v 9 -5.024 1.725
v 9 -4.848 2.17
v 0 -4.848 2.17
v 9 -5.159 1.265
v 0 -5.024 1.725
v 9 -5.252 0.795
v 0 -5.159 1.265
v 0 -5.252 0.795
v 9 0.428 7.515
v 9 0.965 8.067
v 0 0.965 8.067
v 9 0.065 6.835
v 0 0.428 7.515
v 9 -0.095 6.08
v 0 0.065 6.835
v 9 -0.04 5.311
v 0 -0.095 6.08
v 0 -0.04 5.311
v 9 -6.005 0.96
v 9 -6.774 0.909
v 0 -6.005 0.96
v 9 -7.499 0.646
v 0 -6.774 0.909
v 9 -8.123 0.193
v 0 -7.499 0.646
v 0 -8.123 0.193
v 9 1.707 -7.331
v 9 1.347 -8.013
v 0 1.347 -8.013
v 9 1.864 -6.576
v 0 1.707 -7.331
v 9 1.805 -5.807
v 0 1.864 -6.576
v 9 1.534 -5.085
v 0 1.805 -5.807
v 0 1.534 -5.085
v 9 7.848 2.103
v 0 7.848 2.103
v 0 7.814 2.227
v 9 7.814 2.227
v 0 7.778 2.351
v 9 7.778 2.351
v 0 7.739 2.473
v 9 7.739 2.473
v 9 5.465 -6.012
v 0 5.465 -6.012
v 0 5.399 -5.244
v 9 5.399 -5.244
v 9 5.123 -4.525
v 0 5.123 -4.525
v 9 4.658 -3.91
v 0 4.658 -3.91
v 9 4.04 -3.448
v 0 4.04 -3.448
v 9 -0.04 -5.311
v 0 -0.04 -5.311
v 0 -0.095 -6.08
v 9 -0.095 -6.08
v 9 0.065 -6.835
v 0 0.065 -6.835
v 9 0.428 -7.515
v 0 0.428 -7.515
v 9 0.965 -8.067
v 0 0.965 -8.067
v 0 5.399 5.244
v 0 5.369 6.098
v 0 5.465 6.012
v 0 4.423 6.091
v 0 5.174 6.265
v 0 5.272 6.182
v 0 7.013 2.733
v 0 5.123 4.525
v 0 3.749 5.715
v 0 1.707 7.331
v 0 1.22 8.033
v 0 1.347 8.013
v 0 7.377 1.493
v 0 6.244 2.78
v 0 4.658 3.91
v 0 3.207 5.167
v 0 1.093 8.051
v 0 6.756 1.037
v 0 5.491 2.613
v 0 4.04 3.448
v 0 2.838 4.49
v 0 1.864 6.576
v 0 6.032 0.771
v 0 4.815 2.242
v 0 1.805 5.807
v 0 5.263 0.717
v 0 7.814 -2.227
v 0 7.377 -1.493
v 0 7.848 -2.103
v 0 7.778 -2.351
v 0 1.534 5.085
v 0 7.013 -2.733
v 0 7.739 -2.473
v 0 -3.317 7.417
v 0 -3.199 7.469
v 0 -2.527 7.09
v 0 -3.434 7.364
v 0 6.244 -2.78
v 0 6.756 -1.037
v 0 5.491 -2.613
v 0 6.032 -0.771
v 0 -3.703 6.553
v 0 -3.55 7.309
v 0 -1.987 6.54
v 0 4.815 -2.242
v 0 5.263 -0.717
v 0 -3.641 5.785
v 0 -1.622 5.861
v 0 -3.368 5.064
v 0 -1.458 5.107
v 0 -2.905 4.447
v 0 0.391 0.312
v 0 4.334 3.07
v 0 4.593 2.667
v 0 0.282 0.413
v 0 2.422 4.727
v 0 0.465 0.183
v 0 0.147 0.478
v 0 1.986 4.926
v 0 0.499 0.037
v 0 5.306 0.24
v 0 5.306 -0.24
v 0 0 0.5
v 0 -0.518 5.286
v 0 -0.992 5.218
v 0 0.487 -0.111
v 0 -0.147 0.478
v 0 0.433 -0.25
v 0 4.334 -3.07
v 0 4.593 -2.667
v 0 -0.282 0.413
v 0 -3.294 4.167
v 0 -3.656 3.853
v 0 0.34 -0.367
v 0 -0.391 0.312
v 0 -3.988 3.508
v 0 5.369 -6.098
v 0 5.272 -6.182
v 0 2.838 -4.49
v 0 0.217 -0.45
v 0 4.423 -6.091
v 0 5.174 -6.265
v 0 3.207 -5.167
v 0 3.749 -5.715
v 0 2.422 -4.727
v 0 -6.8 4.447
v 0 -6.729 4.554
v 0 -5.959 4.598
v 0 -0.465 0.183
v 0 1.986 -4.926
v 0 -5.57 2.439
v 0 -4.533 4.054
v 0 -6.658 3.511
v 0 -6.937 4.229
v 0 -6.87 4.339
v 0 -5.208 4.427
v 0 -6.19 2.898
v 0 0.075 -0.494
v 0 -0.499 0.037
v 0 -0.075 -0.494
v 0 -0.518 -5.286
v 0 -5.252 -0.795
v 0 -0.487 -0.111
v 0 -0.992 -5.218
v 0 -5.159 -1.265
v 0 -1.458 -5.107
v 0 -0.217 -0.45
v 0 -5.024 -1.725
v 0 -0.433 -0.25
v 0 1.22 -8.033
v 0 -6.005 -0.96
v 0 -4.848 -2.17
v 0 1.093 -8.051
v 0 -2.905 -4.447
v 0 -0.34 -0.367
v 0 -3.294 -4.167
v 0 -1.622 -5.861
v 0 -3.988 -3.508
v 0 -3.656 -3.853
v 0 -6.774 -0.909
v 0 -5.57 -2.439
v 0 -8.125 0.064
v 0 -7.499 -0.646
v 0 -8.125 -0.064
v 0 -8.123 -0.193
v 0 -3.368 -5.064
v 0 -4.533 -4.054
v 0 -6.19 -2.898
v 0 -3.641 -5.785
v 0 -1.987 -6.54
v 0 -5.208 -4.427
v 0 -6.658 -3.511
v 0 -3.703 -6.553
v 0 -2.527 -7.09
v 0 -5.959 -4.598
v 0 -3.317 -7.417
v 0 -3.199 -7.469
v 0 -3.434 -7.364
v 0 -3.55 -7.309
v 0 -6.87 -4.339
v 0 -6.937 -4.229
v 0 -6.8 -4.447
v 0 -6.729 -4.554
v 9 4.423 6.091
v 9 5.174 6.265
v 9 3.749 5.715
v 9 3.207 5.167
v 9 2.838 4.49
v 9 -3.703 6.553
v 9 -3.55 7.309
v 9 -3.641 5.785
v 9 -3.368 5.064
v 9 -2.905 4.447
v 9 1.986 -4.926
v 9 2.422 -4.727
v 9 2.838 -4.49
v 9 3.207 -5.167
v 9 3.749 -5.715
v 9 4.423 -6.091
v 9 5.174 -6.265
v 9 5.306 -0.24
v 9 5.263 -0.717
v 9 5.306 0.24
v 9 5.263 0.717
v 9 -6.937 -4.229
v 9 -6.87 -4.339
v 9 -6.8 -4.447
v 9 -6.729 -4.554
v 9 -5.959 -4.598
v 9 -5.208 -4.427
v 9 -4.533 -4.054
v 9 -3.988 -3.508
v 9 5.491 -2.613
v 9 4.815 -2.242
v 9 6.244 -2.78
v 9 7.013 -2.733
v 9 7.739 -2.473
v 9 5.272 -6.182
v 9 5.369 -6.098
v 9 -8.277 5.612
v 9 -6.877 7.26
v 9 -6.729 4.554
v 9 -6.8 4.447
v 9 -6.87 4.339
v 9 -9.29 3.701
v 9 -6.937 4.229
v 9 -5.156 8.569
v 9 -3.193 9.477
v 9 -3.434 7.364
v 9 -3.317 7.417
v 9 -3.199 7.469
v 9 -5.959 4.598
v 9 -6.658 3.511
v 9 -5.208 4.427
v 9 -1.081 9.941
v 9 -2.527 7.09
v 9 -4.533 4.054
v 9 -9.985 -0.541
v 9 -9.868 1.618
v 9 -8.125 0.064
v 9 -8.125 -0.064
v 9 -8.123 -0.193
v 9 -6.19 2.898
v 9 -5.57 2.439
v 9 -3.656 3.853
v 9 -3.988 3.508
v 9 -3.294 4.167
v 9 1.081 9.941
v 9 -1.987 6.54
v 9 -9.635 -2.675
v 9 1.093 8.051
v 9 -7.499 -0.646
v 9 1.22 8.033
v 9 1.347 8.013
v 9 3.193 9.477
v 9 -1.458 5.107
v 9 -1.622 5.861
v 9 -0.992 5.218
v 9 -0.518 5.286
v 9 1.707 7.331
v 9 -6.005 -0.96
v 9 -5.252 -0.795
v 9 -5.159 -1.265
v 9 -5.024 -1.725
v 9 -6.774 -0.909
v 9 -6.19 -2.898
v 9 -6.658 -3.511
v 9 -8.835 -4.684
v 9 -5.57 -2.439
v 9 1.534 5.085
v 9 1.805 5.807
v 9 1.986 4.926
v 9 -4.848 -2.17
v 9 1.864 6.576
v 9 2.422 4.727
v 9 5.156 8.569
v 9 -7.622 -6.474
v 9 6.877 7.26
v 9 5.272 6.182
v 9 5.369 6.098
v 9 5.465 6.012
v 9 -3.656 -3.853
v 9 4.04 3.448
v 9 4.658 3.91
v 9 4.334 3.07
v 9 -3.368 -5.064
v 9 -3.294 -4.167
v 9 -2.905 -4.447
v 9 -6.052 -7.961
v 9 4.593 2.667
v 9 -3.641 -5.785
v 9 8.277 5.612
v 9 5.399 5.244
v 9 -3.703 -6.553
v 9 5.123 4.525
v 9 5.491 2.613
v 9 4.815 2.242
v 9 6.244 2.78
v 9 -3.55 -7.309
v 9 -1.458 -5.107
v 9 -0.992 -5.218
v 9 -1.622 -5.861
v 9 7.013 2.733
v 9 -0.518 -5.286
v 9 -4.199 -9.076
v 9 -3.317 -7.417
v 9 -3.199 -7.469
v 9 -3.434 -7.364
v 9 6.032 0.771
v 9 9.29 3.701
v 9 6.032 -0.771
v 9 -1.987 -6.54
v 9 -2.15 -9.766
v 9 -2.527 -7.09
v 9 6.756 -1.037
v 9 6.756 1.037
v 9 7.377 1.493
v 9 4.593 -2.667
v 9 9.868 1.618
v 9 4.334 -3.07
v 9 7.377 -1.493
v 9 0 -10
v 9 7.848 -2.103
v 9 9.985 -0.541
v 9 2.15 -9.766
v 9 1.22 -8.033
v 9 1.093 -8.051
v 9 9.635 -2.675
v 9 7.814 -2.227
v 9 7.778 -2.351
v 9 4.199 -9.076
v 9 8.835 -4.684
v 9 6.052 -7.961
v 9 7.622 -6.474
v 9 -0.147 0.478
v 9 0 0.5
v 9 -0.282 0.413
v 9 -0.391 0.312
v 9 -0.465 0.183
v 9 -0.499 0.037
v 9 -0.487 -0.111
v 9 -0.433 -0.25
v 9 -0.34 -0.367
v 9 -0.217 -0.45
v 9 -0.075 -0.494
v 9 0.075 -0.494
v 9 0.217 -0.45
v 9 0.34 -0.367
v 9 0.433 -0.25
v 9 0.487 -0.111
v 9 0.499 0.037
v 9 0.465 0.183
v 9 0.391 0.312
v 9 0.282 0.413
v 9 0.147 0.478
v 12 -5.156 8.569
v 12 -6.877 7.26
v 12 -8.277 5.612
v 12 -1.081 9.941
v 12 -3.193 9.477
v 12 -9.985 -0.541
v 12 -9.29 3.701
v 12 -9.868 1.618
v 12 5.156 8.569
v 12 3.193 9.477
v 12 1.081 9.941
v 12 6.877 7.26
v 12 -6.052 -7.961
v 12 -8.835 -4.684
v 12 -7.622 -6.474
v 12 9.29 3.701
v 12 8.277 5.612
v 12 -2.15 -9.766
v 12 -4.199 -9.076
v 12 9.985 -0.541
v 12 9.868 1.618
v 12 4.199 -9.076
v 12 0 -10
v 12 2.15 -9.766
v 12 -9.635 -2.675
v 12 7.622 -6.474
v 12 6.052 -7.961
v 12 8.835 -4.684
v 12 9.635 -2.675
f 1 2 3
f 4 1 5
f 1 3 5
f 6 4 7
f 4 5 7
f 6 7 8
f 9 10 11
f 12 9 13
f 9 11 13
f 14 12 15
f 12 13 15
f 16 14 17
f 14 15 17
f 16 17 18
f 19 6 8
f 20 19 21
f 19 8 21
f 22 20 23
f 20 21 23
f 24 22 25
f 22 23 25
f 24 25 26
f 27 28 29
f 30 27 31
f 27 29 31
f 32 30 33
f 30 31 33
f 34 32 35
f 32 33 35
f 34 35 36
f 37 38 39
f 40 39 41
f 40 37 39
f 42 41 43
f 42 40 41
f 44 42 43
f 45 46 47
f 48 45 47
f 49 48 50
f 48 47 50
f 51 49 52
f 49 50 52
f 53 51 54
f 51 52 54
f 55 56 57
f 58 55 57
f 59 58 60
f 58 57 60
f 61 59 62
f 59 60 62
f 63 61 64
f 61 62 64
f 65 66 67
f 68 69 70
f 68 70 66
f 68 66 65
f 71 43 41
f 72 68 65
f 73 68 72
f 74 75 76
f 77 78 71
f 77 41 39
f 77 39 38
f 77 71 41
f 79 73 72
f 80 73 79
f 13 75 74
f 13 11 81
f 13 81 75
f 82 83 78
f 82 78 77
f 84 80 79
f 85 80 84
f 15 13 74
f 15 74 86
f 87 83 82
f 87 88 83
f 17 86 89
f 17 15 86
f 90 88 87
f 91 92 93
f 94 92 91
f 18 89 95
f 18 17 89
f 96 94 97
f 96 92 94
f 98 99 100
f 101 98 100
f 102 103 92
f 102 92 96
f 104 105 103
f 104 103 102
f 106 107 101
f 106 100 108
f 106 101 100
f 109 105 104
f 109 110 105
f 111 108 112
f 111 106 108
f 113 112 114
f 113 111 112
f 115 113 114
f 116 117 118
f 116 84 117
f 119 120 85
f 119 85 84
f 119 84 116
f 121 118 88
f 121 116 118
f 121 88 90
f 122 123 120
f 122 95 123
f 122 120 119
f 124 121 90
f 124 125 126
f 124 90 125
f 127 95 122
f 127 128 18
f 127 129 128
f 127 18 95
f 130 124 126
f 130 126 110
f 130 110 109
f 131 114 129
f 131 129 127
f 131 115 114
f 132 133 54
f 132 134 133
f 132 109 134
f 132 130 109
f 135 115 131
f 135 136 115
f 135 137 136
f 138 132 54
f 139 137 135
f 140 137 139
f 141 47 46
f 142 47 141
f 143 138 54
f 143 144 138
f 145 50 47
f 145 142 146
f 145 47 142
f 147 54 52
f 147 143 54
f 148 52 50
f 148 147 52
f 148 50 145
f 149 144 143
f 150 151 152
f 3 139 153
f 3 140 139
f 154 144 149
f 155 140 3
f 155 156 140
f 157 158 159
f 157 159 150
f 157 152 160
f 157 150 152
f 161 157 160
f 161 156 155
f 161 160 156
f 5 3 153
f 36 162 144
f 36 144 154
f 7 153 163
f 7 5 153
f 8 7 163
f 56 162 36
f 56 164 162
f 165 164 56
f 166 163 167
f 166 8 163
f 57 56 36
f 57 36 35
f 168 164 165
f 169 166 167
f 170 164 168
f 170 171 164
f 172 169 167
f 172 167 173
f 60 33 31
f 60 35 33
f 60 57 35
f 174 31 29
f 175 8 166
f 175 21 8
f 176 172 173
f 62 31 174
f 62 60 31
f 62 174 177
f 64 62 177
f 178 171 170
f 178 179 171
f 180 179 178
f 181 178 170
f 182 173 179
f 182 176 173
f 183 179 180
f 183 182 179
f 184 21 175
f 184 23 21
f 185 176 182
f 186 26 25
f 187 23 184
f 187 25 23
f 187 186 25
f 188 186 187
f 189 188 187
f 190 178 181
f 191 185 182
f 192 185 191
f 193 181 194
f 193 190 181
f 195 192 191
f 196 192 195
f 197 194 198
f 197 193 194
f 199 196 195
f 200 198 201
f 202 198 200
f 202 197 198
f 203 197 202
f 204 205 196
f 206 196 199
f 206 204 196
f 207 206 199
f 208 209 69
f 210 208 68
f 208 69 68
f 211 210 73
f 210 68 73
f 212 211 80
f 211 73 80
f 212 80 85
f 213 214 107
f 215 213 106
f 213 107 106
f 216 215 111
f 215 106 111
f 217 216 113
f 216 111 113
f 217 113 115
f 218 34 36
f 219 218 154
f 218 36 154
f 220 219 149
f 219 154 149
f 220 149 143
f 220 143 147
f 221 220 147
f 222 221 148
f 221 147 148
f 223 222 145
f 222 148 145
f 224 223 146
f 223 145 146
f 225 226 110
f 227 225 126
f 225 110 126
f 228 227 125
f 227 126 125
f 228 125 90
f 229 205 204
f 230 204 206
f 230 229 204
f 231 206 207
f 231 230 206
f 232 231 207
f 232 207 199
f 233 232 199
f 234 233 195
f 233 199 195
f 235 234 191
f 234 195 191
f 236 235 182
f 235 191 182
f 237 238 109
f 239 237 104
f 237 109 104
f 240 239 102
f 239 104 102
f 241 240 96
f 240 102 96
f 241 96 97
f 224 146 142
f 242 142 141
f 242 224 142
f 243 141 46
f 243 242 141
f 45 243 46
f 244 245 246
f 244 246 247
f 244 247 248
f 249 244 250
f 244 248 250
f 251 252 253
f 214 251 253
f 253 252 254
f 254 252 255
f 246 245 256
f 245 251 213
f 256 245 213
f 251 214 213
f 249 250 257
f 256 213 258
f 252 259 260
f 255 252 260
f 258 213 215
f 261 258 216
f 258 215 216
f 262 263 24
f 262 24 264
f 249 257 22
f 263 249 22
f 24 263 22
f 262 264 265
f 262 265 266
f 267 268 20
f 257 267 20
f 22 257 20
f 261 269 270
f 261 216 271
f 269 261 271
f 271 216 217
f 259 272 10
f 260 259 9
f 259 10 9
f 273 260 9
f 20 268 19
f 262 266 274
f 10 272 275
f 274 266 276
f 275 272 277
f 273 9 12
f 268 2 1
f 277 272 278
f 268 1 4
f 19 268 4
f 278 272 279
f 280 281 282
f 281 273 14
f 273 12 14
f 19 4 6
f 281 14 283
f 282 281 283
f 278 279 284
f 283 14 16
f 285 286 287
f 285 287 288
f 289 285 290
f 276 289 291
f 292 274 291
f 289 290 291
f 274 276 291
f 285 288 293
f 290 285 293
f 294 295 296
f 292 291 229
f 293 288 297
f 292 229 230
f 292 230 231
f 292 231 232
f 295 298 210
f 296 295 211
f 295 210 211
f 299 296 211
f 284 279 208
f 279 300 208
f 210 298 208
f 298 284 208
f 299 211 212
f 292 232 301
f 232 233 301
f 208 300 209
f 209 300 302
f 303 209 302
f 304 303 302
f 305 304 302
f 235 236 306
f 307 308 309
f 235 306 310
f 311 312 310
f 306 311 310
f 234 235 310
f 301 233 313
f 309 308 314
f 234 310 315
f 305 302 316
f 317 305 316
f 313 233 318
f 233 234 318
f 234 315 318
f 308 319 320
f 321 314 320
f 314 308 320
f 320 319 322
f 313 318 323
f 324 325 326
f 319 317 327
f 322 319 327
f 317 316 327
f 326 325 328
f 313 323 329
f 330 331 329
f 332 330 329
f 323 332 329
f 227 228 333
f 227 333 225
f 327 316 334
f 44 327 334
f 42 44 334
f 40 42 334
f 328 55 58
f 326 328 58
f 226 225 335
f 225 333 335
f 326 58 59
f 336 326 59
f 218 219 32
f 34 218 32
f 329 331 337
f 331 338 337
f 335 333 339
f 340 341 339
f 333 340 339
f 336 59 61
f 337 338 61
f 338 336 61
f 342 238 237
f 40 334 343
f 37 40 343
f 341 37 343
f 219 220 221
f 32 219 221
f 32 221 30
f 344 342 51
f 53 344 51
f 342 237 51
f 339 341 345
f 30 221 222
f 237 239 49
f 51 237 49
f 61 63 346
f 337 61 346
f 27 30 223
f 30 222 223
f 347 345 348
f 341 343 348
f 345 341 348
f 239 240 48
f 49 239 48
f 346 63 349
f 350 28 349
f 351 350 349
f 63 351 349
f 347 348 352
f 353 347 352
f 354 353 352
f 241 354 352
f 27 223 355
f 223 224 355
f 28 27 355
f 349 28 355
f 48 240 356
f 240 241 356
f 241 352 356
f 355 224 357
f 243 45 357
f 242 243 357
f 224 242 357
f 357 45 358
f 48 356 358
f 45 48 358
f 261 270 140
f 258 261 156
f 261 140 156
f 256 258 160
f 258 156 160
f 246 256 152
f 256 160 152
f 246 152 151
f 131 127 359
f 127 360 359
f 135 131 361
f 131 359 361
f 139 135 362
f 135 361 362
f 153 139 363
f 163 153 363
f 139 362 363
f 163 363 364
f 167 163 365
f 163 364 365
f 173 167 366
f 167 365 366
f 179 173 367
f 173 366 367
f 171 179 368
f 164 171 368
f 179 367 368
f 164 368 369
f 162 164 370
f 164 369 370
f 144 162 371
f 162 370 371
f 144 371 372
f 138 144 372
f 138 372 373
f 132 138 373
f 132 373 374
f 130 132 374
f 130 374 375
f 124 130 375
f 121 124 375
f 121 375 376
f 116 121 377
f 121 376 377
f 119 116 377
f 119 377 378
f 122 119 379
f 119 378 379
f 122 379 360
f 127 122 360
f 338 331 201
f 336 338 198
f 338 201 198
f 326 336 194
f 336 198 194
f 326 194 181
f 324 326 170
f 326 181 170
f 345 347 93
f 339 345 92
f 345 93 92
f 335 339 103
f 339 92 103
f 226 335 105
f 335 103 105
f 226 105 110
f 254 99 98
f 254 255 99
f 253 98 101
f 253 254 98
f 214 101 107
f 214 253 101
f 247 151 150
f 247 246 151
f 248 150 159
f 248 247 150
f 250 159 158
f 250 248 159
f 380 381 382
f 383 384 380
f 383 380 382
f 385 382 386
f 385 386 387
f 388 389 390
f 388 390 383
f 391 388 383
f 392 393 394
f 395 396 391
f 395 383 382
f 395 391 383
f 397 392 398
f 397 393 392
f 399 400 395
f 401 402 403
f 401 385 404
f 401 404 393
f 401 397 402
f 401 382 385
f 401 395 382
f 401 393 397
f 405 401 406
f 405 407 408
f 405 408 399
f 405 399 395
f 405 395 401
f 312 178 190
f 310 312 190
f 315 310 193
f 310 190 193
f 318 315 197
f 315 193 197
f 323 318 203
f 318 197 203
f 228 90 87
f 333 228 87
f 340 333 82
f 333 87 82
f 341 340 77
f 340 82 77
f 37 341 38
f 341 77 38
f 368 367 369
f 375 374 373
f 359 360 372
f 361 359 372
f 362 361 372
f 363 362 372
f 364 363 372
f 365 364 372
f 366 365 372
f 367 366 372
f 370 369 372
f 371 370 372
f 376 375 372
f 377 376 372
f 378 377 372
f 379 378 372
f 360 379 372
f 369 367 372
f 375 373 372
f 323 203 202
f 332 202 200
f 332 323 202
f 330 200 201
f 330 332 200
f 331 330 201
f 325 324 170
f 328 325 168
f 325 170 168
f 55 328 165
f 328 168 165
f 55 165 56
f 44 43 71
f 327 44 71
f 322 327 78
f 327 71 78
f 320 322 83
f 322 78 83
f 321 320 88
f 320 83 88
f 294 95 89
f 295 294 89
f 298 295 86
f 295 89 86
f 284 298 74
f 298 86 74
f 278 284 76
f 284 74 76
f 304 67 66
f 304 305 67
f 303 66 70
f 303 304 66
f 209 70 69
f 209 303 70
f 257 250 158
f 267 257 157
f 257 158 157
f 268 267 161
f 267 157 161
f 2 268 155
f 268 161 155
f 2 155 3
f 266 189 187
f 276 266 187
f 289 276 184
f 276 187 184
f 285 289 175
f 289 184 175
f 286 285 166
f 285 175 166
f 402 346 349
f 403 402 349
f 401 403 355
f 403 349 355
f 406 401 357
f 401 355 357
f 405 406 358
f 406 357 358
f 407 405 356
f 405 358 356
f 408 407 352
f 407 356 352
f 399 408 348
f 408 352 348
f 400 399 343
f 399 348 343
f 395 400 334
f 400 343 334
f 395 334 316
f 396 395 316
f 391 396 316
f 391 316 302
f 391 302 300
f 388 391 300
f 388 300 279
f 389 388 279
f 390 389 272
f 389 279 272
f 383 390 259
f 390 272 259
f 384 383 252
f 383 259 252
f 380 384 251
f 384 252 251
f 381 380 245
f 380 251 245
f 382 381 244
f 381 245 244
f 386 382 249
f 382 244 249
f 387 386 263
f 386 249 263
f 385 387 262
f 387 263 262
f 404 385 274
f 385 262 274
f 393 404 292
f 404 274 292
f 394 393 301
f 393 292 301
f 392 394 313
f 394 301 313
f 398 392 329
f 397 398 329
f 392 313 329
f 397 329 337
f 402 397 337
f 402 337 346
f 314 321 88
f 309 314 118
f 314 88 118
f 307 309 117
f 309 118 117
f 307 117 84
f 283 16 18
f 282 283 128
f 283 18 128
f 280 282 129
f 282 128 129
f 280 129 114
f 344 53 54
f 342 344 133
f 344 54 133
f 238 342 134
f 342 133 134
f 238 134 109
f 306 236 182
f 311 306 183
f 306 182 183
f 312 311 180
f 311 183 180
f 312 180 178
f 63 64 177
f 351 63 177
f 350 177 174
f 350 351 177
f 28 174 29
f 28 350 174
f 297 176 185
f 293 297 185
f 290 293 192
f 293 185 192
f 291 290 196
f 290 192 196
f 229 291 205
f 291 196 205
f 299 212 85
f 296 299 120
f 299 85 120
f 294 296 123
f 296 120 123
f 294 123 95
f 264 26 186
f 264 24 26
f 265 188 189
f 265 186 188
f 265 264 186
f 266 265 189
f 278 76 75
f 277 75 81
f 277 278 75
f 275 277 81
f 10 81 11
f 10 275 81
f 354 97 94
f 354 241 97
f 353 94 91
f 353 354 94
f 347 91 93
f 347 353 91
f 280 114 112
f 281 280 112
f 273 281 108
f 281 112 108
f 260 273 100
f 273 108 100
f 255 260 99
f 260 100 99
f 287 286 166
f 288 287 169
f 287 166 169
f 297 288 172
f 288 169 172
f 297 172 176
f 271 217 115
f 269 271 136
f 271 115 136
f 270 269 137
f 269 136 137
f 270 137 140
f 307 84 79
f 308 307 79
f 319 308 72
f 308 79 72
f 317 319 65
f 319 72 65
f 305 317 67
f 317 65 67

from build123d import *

# Parameters (mm, degrees)
BASPROSKE_W         = 9
BASPROSKE_H         = 8.125
TOOTHCUT_DEPTH      = 15.595590087
TEETHCUTS_COUNT     = 11
TEETHCUTS_ANGLE     = 327.272727273
BORSKE_R            = 0.5
BORE_DEPTH          = 50.0000508
SKETCH1_R           = 10
BOSS_EXTRUDE1_DEPTH = 3


with BuildPart() as part:
    # BasProSke → Base-Revolve (revolve)
    with BuildSketch(Plane(origin=(0, 0, 0), x_dir=(1, 0, 0), z_dir=(0, 1, 0)), mode=Mode.PRIVATE) as base_revolve_sk:
        with Locations((4.5, 4.0625)):
            Rectangle(BASPROSKE_W, BASPROSKE_H)
    revolve(base_revolve_sk.sketch.rotate(Axis((-10, 0, 0), (1, 0, 0)), 180), axis=Axis((-10, 0, 0), (1, 0, 0)))

    # TooCutSke → ToothCut (cut, through all)
    with BuildSketch(Plane(origin=(0, 0, 0), x_dir=(0, 0, -1), z_dir=(1, 0, 0))):
        with BuildLine():
            ThreePointArc((0.716661614, 5.262929639), (0, 5.3115), (-0.716661614, 5.262929639))
            ThreePointArc((-0.716661614, 5.262929639), (-1.045232485, 6.771828733), (-2.135233901, 7.865735589))
            ThreePointArc((-2.135233901, 7.865735589), (0, 8.1504), (2.135233901, 7.865735589))
            ThreePointArc((2.135233901, 7.865735589), (1.045232485, 6.771828733), (0.716661614, 5.262929639))
        make_face()
    toothcut = extrude(amount=TOOTHCUT_DEPTH, mode=Mode.SUBTRACT)

    # TeethCuts: ToothCut ×11 about axis
    teethcuts_axis = Axis((-10, 0, 0), (1, 0, 0))
    for i in range(1, TEETHCUTS_COUNT):
        add(toothcut.rotate(teethcuts_axis, i * TEETHCUTS_ANGLE / (TEETHCUTS_COUNT - 1)), mode=Mode.SUBTRACT)

    # BorSke → Bore (cut, symmetric)
    with BuildSketch(Plane(origin=(0, 0, 0), x_dir=(0, 0, -1), z_dir=(1, 0, 0))):
        with Locations(Location((0, 0, 0), (0, 0, 180))):
            Circle(BORSKE_R)
    extrude(amount=BORE_DEPTH, both=True, mode=Mode.SUBTRACT)

    # Sketch1 → Boss-Extrude1 (add)
    with BuildSketch(Plane(origin=(9, 0, 0), x_dir=(0, 0, -1), z_dir=(1, 0, 0))):
        Circle(SKETCH1_R)
    extrude(amount=BOSS_EXTRUDE1_DEPTH)


solid = part.part
